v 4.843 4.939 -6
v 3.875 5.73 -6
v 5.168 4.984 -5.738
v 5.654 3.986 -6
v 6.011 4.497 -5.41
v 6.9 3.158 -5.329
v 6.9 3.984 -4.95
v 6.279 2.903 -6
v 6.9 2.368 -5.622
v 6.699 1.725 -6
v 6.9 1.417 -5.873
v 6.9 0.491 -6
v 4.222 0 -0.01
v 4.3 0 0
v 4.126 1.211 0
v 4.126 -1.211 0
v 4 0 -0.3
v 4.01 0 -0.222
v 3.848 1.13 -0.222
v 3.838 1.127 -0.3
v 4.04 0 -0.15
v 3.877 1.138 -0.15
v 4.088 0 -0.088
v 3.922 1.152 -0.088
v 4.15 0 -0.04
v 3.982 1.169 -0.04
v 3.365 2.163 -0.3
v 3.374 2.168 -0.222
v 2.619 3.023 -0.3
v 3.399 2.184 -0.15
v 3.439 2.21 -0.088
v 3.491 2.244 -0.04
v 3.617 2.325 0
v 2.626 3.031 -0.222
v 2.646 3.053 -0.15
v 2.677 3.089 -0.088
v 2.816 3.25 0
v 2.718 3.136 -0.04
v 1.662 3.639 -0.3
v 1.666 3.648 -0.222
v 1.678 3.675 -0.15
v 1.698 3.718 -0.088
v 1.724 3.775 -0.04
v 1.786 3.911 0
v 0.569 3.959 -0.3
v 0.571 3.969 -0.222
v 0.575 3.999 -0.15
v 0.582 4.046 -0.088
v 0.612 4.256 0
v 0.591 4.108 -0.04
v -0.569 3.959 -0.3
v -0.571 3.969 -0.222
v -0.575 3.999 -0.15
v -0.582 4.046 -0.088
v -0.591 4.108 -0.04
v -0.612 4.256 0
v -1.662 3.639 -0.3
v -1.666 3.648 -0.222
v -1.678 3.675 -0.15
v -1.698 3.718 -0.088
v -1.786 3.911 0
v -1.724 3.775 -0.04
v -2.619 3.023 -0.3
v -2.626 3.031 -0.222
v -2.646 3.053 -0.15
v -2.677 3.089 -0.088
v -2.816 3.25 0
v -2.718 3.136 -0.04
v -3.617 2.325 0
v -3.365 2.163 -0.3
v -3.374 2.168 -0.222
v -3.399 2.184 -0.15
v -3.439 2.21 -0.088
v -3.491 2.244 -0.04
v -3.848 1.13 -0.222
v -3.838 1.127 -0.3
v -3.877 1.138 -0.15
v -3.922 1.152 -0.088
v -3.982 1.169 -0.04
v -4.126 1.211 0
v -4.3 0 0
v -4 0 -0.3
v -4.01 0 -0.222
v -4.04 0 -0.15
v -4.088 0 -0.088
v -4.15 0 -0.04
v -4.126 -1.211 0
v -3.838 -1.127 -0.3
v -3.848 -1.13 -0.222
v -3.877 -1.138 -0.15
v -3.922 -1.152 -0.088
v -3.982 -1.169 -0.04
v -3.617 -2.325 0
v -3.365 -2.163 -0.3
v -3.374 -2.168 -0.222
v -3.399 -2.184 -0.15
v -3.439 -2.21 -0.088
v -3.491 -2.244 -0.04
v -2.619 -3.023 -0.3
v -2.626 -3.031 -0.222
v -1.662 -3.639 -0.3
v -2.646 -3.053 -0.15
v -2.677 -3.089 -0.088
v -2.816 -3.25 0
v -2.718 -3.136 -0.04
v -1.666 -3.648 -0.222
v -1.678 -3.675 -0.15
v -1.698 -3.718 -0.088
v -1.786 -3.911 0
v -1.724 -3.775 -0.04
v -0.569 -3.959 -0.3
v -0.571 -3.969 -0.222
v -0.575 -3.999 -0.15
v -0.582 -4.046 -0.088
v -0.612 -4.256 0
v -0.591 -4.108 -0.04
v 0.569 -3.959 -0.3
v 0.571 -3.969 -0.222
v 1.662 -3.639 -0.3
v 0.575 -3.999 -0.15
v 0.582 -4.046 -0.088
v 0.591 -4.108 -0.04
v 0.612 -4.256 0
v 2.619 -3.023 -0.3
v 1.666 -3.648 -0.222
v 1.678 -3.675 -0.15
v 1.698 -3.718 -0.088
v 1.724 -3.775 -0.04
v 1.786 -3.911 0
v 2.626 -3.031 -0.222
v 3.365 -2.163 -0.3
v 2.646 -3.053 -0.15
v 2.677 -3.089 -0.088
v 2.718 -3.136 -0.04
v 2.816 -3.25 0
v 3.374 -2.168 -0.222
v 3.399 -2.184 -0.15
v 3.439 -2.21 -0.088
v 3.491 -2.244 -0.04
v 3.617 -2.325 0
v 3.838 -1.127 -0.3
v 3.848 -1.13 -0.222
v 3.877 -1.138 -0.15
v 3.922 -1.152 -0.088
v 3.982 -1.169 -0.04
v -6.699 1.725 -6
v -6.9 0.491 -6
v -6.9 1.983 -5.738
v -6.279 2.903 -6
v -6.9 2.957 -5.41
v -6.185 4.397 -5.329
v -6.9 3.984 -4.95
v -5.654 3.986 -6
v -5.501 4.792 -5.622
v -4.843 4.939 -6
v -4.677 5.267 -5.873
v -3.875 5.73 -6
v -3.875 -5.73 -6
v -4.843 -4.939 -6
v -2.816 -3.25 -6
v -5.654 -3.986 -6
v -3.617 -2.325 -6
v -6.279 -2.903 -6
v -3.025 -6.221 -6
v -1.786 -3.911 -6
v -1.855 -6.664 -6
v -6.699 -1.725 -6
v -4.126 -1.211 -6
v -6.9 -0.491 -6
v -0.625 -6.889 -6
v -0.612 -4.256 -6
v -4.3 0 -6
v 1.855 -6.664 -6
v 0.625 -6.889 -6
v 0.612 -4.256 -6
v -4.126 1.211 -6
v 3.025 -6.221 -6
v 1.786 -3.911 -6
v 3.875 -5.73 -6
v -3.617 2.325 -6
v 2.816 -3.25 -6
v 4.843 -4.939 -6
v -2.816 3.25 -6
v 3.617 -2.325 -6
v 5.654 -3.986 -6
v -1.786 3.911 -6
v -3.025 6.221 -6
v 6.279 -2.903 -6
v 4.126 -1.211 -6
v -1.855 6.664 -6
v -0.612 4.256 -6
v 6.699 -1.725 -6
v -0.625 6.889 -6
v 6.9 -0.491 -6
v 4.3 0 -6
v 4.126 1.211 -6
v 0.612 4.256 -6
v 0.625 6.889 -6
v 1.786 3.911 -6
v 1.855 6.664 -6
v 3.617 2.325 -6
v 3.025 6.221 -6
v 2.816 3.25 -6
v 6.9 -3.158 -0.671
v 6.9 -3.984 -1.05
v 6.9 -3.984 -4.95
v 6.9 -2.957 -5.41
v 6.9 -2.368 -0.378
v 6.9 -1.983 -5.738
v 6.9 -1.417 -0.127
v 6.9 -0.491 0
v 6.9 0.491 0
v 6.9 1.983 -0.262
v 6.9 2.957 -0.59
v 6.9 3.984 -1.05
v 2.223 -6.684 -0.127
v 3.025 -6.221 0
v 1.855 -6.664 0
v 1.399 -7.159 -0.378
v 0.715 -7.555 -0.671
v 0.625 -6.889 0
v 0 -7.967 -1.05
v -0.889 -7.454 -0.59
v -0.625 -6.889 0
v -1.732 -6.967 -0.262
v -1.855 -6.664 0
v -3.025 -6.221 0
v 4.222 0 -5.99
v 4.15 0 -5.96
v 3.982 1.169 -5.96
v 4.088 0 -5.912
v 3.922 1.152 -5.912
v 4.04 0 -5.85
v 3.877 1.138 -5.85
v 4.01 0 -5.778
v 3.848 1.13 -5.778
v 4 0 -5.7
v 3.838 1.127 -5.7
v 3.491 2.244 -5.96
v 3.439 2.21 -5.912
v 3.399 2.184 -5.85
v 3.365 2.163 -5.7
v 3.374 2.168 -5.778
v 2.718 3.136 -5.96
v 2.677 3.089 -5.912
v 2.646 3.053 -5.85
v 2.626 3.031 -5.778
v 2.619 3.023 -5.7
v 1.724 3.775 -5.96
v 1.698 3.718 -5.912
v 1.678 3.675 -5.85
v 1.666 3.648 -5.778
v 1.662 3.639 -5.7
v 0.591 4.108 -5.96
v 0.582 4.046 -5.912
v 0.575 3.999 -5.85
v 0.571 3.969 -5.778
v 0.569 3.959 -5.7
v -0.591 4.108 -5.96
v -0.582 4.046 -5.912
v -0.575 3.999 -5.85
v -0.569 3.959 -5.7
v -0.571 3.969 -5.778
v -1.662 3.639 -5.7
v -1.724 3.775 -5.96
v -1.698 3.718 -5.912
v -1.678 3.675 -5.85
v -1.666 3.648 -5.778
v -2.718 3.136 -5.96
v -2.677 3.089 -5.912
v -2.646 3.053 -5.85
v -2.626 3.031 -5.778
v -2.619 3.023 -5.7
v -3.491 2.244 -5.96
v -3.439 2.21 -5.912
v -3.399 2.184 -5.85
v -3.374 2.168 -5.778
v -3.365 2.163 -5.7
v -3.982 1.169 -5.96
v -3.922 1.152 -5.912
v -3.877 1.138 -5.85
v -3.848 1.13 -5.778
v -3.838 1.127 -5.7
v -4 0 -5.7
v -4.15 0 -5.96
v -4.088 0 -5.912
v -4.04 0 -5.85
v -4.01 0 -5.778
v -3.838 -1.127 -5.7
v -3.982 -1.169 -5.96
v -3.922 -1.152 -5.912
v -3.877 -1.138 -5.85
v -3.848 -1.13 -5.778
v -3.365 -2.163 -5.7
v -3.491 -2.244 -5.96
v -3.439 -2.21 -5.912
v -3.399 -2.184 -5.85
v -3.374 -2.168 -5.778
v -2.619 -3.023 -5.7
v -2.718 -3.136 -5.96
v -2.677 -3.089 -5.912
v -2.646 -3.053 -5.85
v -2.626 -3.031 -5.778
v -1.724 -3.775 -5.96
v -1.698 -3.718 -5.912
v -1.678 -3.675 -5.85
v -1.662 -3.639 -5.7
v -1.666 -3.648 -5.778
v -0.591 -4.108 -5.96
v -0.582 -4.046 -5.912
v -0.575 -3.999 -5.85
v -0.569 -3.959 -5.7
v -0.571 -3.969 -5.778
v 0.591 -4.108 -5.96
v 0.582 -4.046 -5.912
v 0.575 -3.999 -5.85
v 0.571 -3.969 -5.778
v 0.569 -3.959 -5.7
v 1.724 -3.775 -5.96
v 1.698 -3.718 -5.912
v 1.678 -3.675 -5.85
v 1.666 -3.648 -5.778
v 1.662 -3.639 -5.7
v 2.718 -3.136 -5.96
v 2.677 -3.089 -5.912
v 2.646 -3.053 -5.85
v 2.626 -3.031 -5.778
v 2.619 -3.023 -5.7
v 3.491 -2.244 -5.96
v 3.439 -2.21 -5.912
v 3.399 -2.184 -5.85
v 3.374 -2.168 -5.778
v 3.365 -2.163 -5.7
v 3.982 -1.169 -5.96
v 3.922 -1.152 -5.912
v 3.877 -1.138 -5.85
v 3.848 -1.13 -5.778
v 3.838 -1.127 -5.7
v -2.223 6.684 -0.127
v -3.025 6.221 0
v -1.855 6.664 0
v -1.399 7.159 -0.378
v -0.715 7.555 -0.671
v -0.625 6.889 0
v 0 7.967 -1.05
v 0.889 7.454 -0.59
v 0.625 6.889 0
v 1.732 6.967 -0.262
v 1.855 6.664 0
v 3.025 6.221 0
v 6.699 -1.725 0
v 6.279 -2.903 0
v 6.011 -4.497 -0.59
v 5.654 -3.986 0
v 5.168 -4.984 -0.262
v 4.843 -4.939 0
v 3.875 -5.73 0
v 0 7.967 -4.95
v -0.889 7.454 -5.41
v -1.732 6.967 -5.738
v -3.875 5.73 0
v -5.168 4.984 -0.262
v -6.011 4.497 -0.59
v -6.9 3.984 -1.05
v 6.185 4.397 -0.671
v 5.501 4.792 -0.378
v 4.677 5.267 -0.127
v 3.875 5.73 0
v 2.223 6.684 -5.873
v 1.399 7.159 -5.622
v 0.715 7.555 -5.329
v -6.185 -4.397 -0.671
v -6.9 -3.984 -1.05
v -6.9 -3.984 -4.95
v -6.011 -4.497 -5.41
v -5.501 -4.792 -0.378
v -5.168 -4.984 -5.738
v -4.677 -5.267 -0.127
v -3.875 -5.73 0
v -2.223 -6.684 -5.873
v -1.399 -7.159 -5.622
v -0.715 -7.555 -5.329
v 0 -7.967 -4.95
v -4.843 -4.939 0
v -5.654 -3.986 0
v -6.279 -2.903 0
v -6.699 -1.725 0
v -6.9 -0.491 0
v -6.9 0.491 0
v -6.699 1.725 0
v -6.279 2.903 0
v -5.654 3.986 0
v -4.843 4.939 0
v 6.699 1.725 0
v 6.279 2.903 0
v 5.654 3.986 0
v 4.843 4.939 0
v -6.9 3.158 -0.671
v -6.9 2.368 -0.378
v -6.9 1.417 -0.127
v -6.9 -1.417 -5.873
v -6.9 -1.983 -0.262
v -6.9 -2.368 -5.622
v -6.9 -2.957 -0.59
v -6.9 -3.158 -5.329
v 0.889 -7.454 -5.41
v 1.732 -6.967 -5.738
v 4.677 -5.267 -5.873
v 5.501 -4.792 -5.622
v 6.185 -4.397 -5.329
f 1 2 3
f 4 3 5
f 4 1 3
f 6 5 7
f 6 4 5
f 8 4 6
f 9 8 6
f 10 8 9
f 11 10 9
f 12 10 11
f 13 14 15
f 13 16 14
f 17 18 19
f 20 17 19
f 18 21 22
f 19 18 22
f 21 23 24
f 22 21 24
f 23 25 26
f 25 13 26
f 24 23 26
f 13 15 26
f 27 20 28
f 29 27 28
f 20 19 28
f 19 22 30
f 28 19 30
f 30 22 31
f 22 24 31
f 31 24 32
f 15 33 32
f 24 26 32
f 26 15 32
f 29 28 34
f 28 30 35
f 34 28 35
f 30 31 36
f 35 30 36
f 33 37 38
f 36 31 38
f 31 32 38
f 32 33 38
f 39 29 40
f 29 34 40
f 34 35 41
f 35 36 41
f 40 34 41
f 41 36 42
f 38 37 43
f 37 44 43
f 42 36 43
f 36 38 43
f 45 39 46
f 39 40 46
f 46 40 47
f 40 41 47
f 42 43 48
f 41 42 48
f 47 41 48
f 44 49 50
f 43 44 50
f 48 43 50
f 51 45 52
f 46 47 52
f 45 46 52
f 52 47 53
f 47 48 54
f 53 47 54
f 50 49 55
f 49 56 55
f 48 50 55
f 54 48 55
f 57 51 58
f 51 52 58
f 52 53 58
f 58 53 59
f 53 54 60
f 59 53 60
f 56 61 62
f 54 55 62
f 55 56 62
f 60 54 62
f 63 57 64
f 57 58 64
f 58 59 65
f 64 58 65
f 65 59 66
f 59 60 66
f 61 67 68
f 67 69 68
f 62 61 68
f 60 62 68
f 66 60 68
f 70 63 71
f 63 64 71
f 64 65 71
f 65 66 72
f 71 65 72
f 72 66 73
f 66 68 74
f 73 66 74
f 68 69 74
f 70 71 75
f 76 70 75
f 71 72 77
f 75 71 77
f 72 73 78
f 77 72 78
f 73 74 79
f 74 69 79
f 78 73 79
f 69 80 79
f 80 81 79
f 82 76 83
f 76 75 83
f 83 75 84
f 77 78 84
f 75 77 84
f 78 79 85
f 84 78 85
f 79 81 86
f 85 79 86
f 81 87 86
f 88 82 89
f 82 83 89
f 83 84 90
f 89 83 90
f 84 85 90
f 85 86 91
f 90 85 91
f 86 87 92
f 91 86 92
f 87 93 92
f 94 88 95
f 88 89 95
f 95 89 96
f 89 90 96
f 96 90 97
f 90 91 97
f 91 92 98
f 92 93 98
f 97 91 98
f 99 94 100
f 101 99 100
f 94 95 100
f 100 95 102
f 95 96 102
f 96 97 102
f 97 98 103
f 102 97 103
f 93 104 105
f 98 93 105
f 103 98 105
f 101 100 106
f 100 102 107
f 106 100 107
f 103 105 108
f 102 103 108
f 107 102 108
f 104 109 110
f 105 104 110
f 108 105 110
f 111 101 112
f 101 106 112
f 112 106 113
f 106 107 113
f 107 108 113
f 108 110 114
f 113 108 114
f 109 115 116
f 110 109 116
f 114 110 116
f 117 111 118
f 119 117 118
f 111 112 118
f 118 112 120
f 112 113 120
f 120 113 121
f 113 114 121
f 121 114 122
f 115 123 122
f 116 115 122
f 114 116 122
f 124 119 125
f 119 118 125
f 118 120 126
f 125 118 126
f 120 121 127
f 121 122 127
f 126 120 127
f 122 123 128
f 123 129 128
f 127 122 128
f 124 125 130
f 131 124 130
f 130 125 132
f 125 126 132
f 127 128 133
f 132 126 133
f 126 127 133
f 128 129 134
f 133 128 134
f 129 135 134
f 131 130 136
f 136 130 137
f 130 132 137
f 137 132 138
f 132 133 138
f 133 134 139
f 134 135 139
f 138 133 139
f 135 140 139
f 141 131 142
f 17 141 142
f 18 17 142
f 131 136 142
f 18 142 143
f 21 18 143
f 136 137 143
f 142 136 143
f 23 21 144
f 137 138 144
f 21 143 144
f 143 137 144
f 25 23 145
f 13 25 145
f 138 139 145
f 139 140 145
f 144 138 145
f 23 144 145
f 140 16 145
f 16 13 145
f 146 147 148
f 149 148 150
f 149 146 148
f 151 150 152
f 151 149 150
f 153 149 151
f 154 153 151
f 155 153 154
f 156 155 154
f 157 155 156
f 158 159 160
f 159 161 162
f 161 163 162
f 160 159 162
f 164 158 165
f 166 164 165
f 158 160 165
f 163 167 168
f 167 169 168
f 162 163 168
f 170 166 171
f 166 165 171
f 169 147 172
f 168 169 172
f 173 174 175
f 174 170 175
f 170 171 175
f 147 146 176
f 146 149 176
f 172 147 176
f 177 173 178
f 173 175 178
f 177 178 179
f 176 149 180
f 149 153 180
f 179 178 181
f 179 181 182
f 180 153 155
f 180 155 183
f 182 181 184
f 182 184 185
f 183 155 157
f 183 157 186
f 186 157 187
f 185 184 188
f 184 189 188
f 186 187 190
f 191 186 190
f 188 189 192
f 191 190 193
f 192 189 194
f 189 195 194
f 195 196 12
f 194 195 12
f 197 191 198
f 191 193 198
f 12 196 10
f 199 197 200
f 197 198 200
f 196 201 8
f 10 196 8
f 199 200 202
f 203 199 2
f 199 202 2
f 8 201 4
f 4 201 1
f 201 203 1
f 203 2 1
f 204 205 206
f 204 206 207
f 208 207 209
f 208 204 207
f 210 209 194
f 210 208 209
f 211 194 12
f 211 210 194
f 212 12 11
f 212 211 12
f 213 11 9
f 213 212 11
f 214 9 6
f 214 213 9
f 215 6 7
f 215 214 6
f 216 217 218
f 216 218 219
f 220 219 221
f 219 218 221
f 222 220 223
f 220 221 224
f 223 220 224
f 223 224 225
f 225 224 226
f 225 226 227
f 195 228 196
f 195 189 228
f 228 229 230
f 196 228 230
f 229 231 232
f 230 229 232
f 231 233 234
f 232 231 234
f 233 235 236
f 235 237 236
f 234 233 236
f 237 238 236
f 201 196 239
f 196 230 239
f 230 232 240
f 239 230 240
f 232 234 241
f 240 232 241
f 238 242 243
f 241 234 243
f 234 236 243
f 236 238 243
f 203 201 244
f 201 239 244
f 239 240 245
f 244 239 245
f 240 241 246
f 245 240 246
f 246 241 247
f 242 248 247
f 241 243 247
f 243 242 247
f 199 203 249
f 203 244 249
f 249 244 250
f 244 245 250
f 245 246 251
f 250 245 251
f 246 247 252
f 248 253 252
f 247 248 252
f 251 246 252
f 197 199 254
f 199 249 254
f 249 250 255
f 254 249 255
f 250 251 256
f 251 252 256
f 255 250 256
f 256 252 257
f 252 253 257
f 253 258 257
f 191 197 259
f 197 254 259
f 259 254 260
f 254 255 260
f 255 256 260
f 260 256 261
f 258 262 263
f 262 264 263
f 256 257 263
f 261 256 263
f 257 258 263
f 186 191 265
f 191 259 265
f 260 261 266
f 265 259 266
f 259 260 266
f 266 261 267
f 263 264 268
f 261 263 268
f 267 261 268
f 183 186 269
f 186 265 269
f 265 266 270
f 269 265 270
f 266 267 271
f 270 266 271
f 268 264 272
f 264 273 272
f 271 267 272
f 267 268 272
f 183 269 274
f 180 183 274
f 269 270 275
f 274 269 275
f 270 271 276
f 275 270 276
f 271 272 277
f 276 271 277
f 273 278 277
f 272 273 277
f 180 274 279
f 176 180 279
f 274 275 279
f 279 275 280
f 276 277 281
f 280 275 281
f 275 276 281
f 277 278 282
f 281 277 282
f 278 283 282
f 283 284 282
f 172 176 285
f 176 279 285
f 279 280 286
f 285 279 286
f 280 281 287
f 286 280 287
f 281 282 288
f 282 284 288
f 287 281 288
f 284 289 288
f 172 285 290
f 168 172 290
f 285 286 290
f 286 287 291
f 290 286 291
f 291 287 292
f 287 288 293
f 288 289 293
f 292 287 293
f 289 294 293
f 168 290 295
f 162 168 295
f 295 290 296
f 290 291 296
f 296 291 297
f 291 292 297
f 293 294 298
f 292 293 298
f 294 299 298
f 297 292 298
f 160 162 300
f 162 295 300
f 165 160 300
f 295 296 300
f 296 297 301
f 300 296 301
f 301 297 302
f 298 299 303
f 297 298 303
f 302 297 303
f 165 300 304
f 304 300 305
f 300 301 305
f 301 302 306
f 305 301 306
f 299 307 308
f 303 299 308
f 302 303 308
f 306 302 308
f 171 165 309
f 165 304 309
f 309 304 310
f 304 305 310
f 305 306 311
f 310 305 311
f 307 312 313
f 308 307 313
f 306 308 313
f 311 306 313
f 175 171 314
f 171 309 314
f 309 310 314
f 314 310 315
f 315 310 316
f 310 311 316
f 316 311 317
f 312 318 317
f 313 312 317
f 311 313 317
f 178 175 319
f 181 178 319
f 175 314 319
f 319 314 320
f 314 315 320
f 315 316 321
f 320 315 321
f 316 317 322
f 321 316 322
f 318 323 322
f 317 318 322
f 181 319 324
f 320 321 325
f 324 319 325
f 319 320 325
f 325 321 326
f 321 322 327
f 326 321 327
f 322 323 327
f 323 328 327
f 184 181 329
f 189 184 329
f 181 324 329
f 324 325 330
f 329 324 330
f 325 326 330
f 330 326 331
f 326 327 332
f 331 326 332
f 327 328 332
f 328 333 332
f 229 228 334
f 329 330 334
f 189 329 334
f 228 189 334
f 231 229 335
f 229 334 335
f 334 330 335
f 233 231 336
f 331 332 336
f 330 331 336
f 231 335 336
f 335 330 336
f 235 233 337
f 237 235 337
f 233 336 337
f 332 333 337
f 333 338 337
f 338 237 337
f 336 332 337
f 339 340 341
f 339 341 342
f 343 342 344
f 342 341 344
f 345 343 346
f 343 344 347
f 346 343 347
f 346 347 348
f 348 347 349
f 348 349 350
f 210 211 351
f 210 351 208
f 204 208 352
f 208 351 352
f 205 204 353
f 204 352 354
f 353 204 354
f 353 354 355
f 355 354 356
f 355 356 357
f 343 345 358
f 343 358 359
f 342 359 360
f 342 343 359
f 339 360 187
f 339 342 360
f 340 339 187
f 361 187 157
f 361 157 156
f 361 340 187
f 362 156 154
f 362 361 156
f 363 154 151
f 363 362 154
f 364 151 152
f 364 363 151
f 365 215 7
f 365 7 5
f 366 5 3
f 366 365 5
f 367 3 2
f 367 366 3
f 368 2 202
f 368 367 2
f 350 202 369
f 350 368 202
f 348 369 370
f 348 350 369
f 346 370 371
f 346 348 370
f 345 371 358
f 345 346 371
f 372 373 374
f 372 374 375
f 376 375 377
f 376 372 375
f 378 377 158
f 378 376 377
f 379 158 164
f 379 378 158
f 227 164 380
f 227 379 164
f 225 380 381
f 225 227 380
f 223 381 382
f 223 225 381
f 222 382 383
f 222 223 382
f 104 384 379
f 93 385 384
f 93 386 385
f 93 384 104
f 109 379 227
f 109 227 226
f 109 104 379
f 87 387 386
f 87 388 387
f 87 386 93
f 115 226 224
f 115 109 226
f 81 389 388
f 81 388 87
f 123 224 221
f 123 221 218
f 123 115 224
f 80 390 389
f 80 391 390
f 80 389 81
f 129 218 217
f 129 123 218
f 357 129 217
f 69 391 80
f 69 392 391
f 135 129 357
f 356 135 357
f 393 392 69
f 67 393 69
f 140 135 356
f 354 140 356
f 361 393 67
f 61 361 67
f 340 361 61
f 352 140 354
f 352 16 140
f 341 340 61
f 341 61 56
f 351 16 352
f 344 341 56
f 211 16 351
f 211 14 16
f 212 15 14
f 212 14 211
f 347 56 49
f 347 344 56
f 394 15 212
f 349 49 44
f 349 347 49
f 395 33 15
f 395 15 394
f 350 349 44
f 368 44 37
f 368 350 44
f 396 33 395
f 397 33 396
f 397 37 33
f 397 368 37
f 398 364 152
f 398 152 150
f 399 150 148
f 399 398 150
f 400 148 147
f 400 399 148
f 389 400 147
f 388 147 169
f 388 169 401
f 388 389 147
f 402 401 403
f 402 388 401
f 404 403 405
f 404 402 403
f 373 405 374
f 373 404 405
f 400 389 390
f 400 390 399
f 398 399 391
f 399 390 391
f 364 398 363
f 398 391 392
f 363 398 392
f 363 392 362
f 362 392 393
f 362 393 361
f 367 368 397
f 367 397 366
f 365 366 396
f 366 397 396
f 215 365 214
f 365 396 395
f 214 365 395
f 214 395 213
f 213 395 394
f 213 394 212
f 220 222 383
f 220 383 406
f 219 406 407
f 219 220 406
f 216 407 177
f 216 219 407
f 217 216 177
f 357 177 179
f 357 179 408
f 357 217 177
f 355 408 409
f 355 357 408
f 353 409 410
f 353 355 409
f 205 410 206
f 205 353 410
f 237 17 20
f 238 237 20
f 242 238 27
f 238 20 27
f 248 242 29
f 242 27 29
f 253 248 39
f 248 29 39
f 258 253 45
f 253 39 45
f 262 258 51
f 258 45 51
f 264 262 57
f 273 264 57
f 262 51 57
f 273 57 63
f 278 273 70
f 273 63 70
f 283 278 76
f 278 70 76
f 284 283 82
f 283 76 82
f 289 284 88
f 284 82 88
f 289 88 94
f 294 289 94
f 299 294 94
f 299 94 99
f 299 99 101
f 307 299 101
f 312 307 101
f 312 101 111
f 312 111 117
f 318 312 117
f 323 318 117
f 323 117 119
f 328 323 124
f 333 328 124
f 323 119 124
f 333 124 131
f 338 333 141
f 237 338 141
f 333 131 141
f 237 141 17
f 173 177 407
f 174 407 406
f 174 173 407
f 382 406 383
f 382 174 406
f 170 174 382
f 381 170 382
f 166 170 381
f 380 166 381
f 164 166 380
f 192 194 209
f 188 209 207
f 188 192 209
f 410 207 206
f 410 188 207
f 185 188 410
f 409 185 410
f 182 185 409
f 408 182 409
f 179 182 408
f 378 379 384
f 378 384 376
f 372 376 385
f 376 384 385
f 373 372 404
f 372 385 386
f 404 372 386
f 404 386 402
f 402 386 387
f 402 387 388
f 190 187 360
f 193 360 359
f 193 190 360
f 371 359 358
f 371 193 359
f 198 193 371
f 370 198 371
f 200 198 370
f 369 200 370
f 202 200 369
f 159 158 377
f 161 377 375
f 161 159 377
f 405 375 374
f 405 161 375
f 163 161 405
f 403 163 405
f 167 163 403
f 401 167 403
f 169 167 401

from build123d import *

# Parameters (mm, degrees)
EXTRUDE_1_DEPTH     = 6
SKETCH_2_R          = 4
CUT_EXTRUDE_1_DEPTH = 6
FILLET_3_R          = 0.3


with BuildPart() as part:
    # 草图1 → 凸台-拉伸1 (new body)
    with BuildSketch(Plane.XY):
        Polygon((0, 7.967433715), (-6.9, 3.983716857), (-6.9, -3.983716857), (0, -7.967433715), (6.9, -3.983716857), (6.9, 3.983716857), align=None)
    extrude(amount=-EXTRUDE_1_DEPTH)

    # 草图2 → 切除-拉伸1 (cut)
    with BuildSketch(Plane.XY):
        Circle(SKETCH_2_R)
    extrude(amount=-CUT_EXTRUDE_1_DEPTH, mode=Mode.SUBTRACT)

    # 草图3 → 切除-旋转2 (revolve, cut)
    with BuildSketch(Plane(origin=(0, 0, 0), x_dir=(0, 0, -1), z_dir=(1, 0, 0))):
        Polygon((0, -7.967433715), (1.05, -7.967433715), (0, -6.917433715), align=None)
        Polygon((6, -7.967433715), (4.95, -7.967433715), (6, -6.917433715), align=None)
    revolve(axis=Axis((0, 0, 0), (0, 0, -1)), mode=Mode.SUBTRACT)

    # 圆角3
    fillet_3_edges = [part.edges().sort_by_distance(p)[0] for p in [
        (-4, 0, -6),
        (-4, 0, 0),
    ]]
    fillet(fillet_3_edges, radius=FILLET_3_R)


solid = part.part
